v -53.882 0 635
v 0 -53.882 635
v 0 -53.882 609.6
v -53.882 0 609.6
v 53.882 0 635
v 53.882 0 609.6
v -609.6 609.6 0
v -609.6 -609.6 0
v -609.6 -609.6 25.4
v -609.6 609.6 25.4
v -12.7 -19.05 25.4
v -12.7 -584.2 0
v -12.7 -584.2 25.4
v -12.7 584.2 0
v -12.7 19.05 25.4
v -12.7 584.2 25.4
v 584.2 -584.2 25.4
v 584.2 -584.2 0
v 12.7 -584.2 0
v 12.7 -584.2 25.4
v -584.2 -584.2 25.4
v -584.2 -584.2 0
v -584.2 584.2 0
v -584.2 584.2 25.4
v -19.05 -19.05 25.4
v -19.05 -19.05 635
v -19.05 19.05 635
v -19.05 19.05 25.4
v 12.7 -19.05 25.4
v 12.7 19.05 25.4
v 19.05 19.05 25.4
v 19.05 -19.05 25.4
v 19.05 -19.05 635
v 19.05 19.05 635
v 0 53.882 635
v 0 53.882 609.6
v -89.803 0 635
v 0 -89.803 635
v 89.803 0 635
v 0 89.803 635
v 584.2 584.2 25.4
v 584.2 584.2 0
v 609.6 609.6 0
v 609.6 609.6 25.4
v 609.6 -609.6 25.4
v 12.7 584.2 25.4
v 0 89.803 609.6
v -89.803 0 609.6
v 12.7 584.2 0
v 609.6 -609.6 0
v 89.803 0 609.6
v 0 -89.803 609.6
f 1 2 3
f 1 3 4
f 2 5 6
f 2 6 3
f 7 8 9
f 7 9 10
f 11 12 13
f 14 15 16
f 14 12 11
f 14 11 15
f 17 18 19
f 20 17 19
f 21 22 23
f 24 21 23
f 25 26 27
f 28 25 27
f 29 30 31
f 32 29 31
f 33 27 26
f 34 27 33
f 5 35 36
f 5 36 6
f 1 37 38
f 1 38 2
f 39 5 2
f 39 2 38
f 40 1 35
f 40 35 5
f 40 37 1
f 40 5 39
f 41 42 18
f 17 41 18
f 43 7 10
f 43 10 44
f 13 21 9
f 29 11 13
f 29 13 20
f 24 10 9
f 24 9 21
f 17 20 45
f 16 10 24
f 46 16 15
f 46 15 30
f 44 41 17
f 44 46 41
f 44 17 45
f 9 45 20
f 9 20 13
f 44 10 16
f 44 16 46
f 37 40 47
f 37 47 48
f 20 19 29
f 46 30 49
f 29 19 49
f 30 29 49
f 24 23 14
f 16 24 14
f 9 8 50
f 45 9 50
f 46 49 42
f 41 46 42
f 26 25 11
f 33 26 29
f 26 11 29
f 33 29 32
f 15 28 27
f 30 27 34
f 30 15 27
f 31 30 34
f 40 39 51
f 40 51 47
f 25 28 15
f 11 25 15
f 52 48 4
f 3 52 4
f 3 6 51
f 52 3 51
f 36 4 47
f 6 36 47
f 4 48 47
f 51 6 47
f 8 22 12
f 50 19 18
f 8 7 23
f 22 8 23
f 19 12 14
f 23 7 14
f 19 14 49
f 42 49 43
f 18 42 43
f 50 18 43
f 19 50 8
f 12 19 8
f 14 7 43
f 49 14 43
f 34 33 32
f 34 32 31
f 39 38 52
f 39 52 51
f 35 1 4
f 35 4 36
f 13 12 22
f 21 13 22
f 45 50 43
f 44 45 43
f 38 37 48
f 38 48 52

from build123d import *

# Parameters (mm, degrees)
F0_W     = 1219.2
F0_H     = 1219.2
F0_W_2   = 25.4
F0_H_2   = 1168.4
F1_DEPTH = 25.4
F3_W     = 38.1
F3_H     = 38.1
F4_DEPTH = 609.6
F6_DEPTH = 25.4


with BuildPart() as f1:
    # F0 (on Top) → F1 (new body)
    with BuildSketch(Plane.XY):
        Rectangle(F0_W, F0_H)
        Polygon((-12.7, -584.2), (-584.2, -584.2), (-584.2, 584.2), (-12.7, 584.2), (12.7, 584.2), (584.2, 584.2), (584.2, -584.2), (12.7, -584.2), align=None, mode=Mode.SUBTRACT)
        Rectangle(F0_W_2, F0_H_2)
    extrude(amount=F1_DEPTH)

    # F3 (on face) → F4 (join)
    with BuildSketch(Plane.XY.offset(25.4)):
        Rectangle(F3_W, F3_H)
    extrude(amount=F4_DEPTH)


with BuildPart() as f6:
    # F5 (on face) → F6 (new body)
    with BuildSketch(Plane.XY.offset(635)):
        Polygon((89.802561, 0), (0, 89.802561), (-89.802561, 0), (0, -89.802561), align=None)
        Polygon((0, -53.881537), (-53.881537, 0), (0, 53.881537), (53.881537, 0), align=None, mode=Mode.SUBTRACT)
    extrude(amount=-F6_DEPTH)


solid = Compound([f1.part, f6.part])
